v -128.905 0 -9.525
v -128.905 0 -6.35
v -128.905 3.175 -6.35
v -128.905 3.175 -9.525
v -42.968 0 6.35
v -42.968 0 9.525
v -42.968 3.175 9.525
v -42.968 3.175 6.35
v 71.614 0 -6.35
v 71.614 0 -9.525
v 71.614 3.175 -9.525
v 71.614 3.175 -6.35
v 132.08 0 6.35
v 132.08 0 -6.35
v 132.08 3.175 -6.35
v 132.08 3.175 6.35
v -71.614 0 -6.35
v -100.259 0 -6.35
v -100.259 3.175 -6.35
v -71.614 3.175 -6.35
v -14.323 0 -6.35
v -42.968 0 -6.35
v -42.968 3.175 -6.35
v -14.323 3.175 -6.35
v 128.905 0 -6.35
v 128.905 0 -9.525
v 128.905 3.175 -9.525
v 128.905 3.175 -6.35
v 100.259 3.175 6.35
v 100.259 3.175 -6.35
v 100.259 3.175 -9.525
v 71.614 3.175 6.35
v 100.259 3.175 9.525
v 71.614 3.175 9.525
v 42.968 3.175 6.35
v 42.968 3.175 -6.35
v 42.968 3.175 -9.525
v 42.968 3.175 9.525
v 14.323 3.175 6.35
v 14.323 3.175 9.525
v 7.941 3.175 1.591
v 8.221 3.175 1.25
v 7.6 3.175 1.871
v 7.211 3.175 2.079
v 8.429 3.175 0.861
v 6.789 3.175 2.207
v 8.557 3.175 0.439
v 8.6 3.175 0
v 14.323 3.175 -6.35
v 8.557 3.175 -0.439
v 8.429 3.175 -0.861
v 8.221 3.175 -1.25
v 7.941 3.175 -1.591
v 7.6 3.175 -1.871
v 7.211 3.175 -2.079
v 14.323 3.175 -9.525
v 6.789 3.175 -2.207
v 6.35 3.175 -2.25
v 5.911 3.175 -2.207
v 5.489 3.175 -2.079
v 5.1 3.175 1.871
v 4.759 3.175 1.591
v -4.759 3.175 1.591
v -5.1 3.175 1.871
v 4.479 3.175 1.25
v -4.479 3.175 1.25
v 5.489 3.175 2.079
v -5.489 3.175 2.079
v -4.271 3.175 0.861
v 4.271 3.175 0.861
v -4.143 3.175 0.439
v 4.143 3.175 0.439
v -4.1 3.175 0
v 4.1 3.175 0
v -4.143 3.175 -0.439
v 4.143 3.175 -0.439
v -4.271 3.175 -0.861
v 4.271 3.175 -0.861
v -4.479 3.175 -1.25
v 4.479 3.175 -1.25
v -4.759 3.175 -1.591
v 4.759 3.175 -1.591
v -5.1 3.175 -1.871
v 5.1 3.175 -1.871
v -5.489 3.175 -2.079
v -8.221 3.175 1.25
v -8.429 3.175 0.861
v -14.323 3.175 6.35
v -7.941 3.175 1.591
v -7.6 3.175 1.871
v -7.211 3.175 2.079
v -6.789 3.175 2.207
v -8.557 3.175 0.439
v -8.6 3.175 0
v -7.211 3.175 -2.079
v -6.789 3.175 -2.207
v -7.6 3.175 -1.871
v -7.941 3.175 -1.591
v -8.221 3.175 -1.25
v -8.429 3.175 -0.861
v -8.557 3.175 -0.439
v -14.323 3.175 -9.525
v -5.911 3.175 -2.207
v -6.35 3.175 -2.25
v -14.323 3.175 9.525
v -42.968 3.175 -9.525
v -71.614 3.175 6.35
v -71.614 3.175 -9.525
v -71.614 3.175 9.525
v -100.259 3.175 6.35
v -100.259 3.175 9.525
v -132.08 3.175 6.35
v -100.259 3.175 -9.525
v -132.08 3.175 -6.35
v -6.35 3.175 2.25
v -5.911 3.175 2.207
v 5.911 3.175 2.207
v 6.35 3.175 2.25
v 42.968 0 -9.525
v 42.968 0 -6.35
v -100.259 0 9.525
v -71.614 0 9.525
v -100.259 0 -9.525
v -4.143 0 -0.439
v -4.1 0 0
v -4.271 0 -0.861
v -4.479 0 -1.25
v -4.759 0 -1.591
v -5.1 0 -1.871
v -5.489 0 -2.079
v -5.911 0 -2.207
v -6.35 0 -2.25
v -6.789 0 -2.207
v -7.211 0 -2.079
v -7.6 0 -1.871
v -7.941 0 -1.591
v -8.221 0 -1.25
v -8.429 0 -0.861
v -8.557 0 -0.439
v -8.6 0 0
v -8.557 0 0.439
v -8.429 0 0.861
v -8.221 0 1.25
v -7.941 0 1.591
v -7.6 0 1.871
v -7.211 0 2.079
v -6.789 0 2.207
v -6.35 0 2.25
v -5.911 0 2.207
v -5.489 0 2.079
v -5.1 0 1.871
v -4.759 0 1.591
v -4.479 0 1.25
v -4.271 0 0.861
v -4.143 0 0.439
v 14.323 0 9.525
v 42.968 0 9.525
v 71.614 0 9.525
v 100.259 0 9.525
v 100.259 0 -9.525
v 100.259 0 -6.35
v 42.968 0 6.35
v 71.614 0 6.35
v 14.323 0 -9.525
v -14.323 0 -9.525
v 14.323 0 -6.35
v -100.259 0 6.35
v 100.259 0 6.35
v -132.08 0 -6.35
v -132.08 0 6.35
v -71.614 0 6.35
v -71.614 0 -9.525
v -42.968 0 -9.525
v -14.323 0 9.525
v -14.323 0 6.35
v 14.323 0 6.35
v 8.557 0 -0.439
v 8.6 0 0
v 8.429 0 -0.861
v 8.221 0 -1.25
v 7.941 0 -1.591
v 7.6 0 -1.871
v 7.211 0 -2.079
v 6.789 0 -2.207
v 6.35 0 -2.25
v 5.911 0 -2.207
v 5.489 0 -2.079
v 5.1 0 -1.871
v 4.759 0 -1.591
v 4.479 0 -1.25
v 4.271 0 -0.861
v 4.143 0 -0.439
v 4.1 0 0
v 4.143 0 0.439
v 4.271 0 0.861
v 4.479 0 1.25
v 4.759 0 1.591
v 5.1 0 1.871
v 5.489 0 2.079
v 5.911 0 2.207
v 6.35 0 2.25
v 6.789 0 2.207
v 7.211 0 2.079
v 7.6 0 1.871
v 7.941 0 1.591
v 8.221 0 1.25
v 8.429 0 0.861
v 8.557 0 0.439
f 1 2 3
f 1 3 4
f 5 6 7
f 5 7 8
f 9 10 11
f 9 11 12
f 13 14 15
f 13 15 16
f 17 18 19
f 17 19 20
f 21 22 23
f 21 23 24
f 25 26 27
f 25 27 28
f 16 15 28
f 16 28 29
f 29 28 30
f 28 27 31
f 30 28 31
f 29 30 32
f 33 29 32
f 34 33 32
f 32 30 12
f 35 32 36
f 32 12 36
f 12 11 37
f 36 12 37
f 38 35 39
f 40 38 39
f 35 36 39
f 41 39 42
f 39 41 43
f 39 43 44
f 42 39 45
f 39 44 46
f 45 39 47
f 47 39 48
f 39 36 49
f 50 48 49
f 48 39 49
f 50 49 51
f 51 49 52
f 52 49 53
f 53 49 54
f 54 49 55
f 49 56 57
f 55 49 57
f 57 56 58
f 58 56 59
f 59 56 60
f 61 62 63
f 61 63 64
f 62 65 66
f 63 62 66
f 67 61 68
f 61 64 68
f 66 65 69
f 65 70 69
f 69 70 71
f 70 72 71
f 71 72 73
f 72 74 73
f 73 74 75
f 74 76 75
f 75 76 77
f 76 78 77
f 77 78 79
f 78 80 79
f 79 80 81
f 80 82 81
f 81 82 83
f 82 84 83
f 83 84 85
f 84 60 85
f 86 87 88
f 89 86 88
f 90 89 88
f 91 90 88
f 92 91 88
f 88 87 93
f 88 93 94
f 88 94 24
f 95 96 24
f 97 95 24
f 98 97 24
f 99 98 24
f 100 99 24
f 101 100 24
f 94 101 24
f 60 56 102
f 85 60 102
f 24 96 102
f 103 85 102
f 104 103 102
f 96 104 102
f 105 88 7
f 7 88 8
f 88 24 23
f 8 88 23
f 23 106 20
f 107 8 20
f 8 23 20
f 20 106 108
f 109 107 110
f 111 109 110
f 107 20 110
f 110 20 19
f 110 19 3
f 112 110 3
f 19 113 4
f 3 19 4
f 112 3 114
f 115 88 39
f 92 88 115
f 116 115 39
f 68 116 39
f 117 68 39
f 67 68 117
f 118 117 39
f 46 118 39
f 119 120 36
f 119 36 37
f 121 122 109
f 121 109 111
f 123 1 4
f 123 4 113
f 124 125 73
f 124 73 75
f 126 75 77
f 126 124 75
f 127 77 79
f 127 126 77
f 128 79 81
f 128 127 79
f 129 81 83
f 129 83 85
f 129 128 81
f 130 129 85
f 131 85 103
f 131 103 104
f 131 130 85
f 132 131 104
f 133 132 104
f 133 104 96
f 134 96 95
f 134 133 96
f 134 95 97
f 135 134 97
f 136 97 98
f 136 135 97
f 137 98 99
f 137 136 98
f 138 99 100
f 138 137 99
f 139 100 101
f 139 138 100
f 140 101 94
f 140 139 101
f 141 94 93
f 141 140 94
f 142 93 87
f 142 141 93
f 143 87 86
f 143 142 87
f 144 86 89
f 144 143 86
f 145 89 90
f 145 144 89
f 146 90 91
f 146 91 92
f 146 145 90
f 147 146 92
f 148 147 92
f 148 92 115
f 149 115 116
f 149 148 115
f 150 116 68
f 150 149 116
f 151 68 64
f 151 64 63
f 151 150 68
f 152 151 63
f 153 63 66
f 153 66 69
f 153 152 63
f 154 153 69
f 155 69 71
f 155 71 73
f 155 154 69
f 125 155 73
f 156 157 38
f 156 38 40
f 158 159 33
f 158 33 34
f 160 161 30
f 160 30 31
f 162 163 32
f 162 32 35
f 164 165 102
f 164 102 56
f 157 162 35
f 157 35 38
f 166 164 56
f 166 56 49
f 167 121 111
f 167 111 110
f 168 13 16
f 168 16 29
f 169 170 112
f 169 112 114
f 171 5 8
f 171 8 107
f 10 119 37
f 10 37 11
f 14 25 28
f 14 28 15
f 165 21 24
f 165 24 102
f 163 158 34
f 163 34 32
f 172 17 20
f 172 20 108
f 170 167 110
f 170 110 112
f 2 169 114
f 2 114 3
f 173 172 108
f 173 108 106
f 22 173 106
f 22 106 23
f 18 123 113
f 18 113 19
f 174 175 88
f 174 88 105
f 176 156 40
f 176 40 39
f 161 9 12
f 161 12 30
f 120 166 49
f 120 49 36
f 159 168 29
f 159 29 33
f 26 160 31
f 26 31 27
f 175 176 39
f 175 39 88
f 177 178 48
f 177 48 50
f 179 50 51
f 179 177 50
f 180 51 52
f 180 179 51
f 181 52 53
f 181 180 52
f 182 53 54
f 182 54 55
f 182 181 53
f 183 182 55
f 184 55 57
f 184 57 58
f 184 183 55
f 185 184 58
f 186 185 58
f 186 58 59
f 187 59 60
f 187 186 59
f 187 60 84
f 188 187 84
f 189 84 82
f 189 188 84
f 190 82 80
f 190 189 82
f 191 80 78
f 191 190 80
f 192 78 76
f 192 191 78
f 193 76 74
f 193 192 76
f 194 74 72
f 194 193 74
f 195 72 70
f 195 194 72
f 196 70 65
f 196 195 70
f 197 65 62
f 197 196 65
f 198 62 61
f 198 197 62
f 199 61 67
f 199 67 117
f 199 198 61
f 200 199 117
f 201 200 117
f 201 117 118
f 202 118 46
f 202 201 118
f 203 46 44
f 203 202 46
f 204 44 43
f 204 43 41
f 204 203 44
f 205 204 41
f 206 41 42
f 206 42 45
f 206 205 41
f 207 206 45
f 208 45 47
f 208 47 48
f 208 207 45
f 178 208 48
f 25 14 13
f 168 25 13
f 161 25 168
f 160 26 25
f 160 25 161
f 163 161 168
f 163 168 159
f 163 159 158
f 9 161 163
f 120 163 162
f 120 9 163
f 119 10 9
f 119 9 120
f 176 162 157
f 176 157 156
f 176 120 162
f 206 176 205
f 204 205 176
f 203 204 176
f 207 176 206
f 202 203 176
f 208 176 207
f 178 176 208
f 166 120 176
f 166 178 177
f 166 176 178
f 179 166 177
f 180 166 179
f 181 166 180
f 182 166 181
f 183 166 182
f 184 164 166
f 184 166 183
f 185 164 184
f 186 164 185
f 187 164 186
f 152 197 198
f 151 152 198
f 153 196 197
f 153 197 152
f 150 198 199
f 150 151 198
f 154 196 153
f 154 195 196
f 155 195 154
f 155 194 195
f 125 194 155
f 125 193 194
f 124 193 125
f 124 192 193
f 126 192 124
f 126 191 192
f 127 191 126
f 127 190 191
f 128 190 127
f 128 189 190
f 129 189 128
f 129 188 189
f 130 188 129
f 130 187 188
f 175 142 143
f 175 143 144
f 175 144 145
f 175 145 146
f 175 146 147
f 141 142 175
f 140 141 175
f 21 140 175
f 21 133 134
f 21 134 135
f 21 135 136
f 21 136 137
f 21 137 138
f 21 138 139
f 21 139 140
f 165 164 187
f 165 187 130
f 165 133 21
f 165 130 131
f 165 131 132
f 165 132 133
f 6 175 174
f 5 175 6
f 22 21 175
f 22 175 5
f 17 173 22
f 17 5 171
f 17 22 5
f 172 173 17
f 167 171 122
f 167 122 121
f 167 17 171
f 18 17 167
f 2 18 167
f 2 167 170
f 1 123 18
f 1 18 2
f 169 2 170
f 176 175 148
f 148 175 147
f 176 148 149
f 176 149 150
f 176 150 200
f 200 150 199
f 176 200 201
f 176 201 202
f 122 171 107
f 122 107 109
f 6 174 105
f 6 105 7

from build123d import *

# Parameters (mm, degrees)
SKETCH1_R           = 2.25
BOSS_EXTRUDE2_DEPTH = 3.175


with BuildPart() as part:
    # Sketch1 → Boss-Extrude2 (new body)
    with BuildSketch(Plane(origin=(0, 0, 0), x_dir=(1, 0, 0), z_dir=(0, 1, 0))):
        Polygon((-128.905, 9.525), (-100.259444444, 9.525), (-100.259444444, 6.35), (-71.613888889, 6.35), (-71.613888889, 9.525), (-42.968333333, 9.525), (-42.968333333, 6.35), (-14.322777778, 6.35), (-14.322777778, 9.525), (14.322777778, 9.525), (14.322777778, 6.35), (42.968333333, 6.35), (42.968333333, 9.525), (71.613888889, 9.525), (71.613888889, 6.35), (100.259444444, 6.35), (100.259444444, 9.525), (128.905, 9.525), (128.905, 6.35), (132.08, 6.35), (132.08, -6.35), (100.259444444, -6.35), (100.259444444, -9.525), (71.613888889, -9.525), (71.613888889, -6.35), (42.968333333, -6.35), (42.968333333, -9.525), (14.322777778, -9.525), (14.322777778, -6.35), (-14.322777778, -6.35), (-14.322777778, -9.525), (-42.968333333, -9.525), (-42.968333333, -6.35), (-71.613888889, -6.35), (-71.613888889, -9.525), (-100.259444444, -9.525), (-100.259444444, -6.35), (-132.08, -6.35), (-132.08, 6.35), (-128.905, 6.35), align=None)
        with Locations((6.35, 0)):
            Circle(SKETCH1_R, mode=Mode.SUBTRACT)
        with Locations((-6.35, 0)):
            Circle(SKETCH1_R, mode=Mode.SUBTRACT)
    extrude(amount=BOSS_EXTRUDE2_DEPTH)


solid = part.part
